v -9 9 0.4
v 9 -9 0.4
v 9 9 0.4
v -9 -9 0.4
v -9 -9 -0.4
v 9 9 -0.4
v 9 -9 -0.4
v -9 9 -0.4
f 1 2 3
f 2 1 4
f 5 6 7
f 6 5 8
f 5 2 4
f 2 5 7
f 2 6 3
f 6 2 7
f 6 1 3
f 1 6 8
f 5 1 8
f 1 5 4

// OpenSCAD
// Parameters
pcb_L = 18.0; //[9.0:36.0:0.1]
pcb_W = 18.0; //[9.0:36.0:0.1]
pcb_T = 0.8;  //[0.4:1.6:0.05]

// PCB Module
module pcb_plate() {
  color([0.0, 0.4, 0.2]) // Green color for PCB
  translate([0, 0, 0])
    cube([pcb_L, pcb_W, pcb_T], center=true);
}

// Final Output
pcb_plate();
